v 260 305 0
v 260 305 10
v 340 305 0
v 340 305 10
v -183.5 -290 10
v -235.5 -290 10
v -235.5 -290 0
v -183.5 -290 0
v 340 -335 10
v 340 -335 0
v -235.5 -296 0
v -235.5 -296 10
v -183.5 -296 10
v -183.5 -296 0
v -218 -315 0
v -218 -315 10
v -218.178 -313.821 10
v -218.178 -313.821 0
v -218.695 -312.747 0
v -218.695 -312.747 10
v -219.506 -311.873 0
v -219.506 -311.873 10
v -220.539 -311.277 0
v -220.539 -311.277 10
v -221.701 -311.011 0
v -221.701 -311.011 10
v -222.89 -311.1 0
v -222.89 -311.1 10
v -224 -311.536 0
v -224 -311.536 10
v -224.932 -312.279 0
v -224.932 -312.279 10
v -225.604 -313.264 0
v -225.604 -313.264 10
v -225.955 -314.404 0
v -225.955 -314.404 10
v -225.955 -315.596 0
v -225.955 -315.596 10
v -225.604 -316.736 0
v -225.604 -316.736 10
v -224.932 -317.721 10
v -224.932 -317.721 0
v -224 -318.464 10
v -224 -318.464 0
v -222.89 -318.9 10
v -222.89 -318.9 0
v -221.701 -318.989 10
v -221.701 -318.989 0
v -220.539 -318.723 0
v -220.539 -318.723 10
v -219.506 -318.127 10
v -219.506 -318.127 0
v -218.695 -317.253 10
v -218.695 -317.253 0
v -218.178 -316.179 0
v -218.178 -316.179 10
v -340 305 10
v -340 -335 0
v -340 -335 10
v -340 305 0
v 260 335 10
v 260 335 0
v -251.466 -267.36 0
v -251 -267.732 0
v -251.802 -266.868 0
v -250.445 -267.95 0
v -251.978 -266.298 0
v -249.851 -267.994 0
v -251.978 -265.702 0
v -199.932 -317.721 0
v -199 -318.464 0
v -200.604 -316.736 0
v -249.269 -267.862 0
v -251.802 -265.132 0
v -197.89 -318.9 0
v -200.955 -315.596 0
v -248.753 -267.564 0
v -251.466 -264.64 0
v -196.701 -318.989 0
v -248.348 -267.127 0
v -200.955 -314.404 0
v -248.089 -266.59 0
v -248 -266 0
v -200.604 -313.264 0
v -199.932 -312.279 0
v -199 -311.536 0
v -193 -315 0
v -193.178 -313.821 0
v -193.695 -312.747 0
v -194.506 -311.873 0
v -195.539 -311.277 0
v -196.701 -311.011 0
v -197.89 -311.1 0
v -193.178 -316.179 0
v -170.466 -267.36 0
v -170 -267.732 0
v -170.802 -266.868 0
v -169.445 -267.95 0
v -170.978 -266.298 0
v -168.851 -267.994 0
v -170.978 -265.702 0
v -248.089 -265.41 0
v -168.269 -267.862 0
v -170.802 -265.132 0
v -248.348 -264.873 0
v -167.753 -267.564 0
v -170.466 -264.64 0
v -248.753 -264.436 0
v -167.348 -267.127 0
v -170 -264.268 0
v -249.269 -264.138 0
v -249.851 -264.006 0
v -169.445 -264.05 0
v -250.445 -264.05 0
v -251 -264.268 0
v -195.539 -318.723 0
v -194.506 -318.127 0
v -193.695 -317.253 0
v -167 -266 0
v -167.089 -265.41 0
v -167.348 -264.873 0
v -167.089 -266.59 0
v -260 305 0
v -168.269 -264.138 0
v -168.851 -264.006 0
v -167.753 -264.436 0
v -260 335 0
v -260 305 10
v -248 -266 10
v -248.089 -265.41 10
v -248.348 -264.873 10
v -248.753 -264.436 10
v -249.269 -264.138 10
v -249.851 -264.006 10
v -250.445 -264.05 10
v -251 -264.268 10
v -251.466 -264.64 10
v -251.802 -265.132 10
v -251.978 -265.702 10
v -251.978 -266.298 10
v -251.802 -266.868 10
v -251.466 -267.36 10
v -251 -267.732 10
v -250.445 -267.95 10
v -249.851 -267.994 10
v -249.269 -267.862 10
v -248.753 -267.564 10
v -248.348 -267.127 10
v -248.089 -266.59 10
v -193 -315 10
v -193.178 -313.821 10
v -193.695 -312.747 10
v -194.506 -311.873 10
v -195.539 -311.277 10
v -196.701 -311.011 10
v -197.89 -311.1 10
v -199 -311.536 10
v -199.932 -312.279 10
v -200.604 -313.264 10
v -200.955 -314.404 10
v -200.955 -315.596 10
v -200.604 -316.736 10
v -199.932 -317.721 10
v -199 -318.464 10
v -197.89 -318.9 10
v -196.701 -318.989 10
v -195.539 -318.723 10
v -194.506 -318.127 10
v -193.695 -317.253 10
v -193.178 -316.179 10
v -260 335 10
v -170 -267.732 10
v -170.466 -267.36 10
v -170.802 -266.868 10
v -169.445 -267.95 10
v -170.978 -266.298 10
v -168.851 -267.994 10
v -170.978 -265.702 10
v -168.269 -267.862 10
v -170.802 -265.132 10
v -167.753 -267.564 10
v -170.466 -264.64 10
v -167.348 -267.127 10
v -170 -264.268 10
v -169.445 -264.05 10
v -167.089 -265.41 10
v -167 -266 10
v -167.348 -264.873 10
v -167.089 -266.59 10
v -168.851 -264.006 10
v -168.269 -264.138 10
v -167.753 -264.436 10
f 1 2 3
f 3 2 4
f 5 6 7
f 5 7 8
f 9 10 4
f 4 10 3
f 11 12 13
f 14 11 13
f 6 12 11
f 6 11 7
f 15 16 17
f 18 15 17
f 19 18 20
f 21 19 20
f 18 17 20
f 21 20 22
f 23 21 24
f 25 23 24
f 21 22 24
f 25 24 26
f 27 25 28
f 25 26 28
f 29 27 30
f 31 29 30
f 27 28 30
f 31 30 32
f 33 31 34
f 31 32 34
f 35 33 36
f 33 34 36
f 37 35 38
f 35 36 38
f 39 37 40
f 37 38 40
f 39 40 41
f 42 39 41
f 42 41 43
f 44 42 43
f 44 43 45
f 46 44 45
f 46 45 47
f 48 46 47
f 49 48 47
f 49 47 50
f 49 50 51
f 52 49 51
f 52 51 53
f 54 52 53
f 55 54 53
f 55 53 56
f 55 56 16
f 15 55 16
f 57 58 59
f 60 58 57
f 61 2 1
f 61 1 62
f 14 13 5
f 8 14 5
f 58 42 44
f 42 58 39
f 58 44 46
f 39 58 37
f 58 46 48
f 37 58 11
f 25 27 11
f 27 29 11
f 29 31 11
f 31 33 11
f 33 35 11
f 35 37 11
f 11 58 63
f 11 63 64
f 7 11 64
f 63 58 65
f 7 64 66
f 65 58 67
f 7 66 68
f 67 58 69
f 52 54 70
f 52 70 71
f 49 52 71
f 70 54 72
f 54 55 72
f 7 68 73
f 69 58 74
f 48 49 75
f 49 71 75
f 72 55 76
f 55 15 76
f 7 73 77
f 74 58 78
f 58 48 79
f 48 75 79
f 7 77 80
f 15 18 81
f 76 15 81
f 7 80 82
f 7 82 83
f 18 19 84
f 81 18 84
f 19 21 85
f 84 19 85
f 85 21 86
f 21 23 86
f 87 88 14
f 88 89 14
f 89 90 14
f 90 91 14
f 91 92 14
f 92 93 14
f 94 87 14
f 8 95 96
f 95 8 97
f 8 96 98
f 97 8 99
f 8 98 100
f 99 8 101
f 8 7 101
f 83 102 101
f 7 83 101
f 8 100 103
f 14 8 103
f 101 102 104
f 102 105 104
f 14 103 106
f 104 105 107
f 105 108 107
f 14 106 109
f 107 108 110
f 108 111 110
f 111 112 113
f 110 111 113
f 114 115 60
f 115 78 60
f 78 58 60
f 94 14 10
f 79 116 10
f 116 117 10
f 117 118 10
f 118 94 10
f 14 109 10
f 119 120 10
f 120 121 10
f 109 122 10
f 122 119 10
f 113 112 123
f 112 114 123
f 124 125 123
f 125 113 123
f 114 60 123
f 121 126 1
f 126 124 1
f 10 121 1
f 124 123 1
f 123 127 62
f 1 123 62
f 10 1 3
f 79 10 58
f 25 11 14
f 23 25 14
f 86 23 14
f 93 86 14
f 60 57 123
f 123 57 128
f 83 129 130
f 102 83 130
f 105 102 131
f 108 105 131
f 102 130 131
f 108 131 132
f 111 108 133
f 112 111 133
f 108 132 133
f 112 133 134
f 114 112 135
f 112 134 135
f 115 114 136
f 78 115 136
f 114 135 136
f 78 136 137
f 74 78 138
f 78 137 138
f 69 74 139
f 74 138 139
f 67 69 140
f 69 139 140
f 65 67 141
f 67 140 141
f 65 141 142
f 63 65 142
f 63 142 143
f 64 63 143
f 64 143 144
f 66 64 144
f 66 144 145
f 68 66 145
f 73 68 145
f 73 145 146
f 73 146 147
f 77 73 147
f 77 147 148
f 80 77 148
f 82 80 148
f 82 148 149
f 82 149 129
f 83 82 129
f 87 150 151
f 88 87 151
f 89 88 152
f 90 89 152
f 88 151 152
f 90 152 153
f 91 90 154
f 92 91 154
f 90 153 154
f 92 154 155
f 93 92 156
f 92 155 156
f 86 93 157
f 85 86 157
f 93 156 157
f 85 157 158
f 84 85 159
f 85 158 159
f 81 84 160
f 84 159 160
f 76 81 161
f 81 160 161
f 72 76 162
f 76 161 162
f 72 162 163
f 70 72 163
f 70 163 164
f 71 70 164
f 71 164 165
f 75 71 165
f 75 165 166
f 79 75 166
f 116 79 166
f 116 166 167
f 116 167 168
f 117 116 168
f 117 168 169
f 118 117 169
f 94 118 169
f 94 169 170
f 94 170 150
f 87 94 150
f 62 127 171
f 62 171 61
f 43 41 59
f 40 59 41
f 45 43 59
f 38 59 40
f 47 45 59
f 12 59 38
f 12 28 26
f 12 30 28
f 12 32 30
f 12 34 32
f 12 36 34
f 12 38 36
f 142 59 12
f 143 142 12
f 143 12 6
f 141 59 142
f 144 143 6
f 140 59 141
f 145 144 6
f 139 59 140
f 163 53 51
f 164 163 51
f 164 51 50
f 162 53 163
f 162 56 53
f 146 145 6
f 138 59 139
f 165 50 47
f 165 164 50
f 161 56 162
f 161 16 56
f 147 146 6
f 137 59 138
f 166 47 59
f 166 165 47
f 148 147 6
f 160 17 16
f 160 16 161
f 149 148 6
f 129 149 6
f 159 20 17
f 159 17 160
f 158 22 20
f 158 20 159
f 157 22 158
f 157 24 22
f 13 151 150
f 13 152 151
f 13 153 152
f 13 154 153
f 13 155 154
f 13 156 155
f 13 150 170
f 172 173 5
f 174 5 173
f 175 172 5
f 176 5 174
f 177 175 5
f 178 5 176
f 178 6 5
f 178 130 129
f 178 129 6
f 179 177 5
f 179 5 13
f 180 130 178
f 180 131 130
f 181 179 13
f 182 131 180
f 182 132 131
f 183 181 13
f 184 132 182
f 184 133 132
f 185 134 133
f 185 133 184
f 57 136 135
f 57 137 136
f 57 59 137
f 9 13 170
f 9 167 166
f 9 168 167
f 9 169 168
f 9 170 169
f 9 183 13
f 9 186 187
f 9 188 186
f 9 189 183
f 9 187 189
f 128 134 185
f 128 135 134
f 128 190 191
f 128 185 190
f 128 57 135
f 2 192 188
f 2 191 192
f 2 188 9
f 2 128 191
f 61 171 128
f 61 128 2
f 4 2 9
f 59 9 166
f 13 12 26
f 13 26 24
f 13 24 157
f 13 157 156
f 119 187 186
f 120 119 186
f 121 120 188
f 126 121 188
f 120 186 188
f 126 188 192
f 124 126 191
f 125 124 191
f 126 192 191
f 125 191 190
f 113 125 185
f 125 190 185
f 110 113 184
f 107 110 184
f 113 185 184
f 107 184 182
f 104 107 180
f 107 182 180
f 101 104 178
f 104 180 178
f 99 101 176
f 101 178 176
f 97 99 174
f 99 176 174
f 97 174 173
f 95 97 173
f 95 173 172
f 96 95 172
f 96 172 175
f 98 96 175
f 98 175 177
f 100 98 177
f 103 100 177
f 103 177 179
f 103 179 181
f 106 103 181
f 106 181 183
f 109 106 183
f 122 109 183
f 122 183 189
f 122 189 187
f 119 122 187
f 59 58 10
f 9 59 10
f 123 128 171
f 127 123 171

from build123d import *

# Parameters (mm, degrees)
ESQUISSE1_W             = 680
ESQUISSE1_H             = 670
BOSS_EXTRU_1_DEPTH      = 10
ESQUISSE2_W             = 80
ESQUISSE2_H             = 30
ENL_V_MAT_EXTRU_1_DEPTH = 11
ESQUISSE3_W             = 52
ESQUISSE3_H             = 6
ENL_V_MAT_EXTRU_2_DEPTH = 11
ESQUISSE4_R             = 4
ENL_V_MAT_EXTRU_3_DEPTH = 11
ESQUISSE5_R             = 2
ENL_V_MAT_EXTRU_4_DEPTH = 11


with BuildPart() as part:
    # Esquisse1 → Boss.-Extru.1 (new body)
    with BuildSketch(Plane.XY):
        Rectangle(ESQUISSE1_W, ESQUISSE1_H)
    extrude(amount=BOSS_EXTRU_1_DEPTH)

    # Esquisse2 → Enlèv. mat.-Extru.1 (cut, through all)
    with BuildSketch(Plane.XY.offset(10)):
        with Locations((-300, 320)):
            Rectangle(ESQUISSE2_W, ESQUISSE2_H)
        with Locations((300, 320)):
            Rectangle(ESQUISSE2_W, ESQUISSE2_H)
    extrude(amount=-ENL_V_MAT_EXTRU_1_DEPTH, mode=Mode.SUBTRACT)

    # Esquisse3 → Enlèv. mat.-Extru.2 (cut, through all)
    with BuildSketch(Plane.XY.offset(10)):
        with Locations((-209.5, -293)):
            Rectangle(ESQUISSE3_W, ESQUISSE3_H)
    extrude(amount=-ENL_V_MAT_EXTRU_2_DEPTH, mode=Mode.SUBTRACT)

    # Esquisse4 → Enlèv. mat.-Extru.3 (cut, through all)
    with BuildSketch(Plane.XY.offset(10)):
        with Locations((-222, -315)):
            Circle(ESQUISSE4_R)
        with Locations((-197, -315)):
            Circle(ESQUISSE4_R)
    extrude(amount=-ENL_V_MAT_EXTRU_3_DEPTH, mode=Mode.SUBTRACT)

    # Esquisse5 → Enlèv. mat.-Extru.4 (cut, through all)
    with BuildSketch(Plane.XY.offset(10)):
        with Locations((-250, -266)):
            Circle(ESQUISSE5_R)
        with Locations((-169, -266)):
            Circle(ESQUISSE5_R)
    extrude(amount=-ENL_V_MAT_EXTRU_4_DEPTH, mode=Mode.SUBTRACT)


solid = part.part
